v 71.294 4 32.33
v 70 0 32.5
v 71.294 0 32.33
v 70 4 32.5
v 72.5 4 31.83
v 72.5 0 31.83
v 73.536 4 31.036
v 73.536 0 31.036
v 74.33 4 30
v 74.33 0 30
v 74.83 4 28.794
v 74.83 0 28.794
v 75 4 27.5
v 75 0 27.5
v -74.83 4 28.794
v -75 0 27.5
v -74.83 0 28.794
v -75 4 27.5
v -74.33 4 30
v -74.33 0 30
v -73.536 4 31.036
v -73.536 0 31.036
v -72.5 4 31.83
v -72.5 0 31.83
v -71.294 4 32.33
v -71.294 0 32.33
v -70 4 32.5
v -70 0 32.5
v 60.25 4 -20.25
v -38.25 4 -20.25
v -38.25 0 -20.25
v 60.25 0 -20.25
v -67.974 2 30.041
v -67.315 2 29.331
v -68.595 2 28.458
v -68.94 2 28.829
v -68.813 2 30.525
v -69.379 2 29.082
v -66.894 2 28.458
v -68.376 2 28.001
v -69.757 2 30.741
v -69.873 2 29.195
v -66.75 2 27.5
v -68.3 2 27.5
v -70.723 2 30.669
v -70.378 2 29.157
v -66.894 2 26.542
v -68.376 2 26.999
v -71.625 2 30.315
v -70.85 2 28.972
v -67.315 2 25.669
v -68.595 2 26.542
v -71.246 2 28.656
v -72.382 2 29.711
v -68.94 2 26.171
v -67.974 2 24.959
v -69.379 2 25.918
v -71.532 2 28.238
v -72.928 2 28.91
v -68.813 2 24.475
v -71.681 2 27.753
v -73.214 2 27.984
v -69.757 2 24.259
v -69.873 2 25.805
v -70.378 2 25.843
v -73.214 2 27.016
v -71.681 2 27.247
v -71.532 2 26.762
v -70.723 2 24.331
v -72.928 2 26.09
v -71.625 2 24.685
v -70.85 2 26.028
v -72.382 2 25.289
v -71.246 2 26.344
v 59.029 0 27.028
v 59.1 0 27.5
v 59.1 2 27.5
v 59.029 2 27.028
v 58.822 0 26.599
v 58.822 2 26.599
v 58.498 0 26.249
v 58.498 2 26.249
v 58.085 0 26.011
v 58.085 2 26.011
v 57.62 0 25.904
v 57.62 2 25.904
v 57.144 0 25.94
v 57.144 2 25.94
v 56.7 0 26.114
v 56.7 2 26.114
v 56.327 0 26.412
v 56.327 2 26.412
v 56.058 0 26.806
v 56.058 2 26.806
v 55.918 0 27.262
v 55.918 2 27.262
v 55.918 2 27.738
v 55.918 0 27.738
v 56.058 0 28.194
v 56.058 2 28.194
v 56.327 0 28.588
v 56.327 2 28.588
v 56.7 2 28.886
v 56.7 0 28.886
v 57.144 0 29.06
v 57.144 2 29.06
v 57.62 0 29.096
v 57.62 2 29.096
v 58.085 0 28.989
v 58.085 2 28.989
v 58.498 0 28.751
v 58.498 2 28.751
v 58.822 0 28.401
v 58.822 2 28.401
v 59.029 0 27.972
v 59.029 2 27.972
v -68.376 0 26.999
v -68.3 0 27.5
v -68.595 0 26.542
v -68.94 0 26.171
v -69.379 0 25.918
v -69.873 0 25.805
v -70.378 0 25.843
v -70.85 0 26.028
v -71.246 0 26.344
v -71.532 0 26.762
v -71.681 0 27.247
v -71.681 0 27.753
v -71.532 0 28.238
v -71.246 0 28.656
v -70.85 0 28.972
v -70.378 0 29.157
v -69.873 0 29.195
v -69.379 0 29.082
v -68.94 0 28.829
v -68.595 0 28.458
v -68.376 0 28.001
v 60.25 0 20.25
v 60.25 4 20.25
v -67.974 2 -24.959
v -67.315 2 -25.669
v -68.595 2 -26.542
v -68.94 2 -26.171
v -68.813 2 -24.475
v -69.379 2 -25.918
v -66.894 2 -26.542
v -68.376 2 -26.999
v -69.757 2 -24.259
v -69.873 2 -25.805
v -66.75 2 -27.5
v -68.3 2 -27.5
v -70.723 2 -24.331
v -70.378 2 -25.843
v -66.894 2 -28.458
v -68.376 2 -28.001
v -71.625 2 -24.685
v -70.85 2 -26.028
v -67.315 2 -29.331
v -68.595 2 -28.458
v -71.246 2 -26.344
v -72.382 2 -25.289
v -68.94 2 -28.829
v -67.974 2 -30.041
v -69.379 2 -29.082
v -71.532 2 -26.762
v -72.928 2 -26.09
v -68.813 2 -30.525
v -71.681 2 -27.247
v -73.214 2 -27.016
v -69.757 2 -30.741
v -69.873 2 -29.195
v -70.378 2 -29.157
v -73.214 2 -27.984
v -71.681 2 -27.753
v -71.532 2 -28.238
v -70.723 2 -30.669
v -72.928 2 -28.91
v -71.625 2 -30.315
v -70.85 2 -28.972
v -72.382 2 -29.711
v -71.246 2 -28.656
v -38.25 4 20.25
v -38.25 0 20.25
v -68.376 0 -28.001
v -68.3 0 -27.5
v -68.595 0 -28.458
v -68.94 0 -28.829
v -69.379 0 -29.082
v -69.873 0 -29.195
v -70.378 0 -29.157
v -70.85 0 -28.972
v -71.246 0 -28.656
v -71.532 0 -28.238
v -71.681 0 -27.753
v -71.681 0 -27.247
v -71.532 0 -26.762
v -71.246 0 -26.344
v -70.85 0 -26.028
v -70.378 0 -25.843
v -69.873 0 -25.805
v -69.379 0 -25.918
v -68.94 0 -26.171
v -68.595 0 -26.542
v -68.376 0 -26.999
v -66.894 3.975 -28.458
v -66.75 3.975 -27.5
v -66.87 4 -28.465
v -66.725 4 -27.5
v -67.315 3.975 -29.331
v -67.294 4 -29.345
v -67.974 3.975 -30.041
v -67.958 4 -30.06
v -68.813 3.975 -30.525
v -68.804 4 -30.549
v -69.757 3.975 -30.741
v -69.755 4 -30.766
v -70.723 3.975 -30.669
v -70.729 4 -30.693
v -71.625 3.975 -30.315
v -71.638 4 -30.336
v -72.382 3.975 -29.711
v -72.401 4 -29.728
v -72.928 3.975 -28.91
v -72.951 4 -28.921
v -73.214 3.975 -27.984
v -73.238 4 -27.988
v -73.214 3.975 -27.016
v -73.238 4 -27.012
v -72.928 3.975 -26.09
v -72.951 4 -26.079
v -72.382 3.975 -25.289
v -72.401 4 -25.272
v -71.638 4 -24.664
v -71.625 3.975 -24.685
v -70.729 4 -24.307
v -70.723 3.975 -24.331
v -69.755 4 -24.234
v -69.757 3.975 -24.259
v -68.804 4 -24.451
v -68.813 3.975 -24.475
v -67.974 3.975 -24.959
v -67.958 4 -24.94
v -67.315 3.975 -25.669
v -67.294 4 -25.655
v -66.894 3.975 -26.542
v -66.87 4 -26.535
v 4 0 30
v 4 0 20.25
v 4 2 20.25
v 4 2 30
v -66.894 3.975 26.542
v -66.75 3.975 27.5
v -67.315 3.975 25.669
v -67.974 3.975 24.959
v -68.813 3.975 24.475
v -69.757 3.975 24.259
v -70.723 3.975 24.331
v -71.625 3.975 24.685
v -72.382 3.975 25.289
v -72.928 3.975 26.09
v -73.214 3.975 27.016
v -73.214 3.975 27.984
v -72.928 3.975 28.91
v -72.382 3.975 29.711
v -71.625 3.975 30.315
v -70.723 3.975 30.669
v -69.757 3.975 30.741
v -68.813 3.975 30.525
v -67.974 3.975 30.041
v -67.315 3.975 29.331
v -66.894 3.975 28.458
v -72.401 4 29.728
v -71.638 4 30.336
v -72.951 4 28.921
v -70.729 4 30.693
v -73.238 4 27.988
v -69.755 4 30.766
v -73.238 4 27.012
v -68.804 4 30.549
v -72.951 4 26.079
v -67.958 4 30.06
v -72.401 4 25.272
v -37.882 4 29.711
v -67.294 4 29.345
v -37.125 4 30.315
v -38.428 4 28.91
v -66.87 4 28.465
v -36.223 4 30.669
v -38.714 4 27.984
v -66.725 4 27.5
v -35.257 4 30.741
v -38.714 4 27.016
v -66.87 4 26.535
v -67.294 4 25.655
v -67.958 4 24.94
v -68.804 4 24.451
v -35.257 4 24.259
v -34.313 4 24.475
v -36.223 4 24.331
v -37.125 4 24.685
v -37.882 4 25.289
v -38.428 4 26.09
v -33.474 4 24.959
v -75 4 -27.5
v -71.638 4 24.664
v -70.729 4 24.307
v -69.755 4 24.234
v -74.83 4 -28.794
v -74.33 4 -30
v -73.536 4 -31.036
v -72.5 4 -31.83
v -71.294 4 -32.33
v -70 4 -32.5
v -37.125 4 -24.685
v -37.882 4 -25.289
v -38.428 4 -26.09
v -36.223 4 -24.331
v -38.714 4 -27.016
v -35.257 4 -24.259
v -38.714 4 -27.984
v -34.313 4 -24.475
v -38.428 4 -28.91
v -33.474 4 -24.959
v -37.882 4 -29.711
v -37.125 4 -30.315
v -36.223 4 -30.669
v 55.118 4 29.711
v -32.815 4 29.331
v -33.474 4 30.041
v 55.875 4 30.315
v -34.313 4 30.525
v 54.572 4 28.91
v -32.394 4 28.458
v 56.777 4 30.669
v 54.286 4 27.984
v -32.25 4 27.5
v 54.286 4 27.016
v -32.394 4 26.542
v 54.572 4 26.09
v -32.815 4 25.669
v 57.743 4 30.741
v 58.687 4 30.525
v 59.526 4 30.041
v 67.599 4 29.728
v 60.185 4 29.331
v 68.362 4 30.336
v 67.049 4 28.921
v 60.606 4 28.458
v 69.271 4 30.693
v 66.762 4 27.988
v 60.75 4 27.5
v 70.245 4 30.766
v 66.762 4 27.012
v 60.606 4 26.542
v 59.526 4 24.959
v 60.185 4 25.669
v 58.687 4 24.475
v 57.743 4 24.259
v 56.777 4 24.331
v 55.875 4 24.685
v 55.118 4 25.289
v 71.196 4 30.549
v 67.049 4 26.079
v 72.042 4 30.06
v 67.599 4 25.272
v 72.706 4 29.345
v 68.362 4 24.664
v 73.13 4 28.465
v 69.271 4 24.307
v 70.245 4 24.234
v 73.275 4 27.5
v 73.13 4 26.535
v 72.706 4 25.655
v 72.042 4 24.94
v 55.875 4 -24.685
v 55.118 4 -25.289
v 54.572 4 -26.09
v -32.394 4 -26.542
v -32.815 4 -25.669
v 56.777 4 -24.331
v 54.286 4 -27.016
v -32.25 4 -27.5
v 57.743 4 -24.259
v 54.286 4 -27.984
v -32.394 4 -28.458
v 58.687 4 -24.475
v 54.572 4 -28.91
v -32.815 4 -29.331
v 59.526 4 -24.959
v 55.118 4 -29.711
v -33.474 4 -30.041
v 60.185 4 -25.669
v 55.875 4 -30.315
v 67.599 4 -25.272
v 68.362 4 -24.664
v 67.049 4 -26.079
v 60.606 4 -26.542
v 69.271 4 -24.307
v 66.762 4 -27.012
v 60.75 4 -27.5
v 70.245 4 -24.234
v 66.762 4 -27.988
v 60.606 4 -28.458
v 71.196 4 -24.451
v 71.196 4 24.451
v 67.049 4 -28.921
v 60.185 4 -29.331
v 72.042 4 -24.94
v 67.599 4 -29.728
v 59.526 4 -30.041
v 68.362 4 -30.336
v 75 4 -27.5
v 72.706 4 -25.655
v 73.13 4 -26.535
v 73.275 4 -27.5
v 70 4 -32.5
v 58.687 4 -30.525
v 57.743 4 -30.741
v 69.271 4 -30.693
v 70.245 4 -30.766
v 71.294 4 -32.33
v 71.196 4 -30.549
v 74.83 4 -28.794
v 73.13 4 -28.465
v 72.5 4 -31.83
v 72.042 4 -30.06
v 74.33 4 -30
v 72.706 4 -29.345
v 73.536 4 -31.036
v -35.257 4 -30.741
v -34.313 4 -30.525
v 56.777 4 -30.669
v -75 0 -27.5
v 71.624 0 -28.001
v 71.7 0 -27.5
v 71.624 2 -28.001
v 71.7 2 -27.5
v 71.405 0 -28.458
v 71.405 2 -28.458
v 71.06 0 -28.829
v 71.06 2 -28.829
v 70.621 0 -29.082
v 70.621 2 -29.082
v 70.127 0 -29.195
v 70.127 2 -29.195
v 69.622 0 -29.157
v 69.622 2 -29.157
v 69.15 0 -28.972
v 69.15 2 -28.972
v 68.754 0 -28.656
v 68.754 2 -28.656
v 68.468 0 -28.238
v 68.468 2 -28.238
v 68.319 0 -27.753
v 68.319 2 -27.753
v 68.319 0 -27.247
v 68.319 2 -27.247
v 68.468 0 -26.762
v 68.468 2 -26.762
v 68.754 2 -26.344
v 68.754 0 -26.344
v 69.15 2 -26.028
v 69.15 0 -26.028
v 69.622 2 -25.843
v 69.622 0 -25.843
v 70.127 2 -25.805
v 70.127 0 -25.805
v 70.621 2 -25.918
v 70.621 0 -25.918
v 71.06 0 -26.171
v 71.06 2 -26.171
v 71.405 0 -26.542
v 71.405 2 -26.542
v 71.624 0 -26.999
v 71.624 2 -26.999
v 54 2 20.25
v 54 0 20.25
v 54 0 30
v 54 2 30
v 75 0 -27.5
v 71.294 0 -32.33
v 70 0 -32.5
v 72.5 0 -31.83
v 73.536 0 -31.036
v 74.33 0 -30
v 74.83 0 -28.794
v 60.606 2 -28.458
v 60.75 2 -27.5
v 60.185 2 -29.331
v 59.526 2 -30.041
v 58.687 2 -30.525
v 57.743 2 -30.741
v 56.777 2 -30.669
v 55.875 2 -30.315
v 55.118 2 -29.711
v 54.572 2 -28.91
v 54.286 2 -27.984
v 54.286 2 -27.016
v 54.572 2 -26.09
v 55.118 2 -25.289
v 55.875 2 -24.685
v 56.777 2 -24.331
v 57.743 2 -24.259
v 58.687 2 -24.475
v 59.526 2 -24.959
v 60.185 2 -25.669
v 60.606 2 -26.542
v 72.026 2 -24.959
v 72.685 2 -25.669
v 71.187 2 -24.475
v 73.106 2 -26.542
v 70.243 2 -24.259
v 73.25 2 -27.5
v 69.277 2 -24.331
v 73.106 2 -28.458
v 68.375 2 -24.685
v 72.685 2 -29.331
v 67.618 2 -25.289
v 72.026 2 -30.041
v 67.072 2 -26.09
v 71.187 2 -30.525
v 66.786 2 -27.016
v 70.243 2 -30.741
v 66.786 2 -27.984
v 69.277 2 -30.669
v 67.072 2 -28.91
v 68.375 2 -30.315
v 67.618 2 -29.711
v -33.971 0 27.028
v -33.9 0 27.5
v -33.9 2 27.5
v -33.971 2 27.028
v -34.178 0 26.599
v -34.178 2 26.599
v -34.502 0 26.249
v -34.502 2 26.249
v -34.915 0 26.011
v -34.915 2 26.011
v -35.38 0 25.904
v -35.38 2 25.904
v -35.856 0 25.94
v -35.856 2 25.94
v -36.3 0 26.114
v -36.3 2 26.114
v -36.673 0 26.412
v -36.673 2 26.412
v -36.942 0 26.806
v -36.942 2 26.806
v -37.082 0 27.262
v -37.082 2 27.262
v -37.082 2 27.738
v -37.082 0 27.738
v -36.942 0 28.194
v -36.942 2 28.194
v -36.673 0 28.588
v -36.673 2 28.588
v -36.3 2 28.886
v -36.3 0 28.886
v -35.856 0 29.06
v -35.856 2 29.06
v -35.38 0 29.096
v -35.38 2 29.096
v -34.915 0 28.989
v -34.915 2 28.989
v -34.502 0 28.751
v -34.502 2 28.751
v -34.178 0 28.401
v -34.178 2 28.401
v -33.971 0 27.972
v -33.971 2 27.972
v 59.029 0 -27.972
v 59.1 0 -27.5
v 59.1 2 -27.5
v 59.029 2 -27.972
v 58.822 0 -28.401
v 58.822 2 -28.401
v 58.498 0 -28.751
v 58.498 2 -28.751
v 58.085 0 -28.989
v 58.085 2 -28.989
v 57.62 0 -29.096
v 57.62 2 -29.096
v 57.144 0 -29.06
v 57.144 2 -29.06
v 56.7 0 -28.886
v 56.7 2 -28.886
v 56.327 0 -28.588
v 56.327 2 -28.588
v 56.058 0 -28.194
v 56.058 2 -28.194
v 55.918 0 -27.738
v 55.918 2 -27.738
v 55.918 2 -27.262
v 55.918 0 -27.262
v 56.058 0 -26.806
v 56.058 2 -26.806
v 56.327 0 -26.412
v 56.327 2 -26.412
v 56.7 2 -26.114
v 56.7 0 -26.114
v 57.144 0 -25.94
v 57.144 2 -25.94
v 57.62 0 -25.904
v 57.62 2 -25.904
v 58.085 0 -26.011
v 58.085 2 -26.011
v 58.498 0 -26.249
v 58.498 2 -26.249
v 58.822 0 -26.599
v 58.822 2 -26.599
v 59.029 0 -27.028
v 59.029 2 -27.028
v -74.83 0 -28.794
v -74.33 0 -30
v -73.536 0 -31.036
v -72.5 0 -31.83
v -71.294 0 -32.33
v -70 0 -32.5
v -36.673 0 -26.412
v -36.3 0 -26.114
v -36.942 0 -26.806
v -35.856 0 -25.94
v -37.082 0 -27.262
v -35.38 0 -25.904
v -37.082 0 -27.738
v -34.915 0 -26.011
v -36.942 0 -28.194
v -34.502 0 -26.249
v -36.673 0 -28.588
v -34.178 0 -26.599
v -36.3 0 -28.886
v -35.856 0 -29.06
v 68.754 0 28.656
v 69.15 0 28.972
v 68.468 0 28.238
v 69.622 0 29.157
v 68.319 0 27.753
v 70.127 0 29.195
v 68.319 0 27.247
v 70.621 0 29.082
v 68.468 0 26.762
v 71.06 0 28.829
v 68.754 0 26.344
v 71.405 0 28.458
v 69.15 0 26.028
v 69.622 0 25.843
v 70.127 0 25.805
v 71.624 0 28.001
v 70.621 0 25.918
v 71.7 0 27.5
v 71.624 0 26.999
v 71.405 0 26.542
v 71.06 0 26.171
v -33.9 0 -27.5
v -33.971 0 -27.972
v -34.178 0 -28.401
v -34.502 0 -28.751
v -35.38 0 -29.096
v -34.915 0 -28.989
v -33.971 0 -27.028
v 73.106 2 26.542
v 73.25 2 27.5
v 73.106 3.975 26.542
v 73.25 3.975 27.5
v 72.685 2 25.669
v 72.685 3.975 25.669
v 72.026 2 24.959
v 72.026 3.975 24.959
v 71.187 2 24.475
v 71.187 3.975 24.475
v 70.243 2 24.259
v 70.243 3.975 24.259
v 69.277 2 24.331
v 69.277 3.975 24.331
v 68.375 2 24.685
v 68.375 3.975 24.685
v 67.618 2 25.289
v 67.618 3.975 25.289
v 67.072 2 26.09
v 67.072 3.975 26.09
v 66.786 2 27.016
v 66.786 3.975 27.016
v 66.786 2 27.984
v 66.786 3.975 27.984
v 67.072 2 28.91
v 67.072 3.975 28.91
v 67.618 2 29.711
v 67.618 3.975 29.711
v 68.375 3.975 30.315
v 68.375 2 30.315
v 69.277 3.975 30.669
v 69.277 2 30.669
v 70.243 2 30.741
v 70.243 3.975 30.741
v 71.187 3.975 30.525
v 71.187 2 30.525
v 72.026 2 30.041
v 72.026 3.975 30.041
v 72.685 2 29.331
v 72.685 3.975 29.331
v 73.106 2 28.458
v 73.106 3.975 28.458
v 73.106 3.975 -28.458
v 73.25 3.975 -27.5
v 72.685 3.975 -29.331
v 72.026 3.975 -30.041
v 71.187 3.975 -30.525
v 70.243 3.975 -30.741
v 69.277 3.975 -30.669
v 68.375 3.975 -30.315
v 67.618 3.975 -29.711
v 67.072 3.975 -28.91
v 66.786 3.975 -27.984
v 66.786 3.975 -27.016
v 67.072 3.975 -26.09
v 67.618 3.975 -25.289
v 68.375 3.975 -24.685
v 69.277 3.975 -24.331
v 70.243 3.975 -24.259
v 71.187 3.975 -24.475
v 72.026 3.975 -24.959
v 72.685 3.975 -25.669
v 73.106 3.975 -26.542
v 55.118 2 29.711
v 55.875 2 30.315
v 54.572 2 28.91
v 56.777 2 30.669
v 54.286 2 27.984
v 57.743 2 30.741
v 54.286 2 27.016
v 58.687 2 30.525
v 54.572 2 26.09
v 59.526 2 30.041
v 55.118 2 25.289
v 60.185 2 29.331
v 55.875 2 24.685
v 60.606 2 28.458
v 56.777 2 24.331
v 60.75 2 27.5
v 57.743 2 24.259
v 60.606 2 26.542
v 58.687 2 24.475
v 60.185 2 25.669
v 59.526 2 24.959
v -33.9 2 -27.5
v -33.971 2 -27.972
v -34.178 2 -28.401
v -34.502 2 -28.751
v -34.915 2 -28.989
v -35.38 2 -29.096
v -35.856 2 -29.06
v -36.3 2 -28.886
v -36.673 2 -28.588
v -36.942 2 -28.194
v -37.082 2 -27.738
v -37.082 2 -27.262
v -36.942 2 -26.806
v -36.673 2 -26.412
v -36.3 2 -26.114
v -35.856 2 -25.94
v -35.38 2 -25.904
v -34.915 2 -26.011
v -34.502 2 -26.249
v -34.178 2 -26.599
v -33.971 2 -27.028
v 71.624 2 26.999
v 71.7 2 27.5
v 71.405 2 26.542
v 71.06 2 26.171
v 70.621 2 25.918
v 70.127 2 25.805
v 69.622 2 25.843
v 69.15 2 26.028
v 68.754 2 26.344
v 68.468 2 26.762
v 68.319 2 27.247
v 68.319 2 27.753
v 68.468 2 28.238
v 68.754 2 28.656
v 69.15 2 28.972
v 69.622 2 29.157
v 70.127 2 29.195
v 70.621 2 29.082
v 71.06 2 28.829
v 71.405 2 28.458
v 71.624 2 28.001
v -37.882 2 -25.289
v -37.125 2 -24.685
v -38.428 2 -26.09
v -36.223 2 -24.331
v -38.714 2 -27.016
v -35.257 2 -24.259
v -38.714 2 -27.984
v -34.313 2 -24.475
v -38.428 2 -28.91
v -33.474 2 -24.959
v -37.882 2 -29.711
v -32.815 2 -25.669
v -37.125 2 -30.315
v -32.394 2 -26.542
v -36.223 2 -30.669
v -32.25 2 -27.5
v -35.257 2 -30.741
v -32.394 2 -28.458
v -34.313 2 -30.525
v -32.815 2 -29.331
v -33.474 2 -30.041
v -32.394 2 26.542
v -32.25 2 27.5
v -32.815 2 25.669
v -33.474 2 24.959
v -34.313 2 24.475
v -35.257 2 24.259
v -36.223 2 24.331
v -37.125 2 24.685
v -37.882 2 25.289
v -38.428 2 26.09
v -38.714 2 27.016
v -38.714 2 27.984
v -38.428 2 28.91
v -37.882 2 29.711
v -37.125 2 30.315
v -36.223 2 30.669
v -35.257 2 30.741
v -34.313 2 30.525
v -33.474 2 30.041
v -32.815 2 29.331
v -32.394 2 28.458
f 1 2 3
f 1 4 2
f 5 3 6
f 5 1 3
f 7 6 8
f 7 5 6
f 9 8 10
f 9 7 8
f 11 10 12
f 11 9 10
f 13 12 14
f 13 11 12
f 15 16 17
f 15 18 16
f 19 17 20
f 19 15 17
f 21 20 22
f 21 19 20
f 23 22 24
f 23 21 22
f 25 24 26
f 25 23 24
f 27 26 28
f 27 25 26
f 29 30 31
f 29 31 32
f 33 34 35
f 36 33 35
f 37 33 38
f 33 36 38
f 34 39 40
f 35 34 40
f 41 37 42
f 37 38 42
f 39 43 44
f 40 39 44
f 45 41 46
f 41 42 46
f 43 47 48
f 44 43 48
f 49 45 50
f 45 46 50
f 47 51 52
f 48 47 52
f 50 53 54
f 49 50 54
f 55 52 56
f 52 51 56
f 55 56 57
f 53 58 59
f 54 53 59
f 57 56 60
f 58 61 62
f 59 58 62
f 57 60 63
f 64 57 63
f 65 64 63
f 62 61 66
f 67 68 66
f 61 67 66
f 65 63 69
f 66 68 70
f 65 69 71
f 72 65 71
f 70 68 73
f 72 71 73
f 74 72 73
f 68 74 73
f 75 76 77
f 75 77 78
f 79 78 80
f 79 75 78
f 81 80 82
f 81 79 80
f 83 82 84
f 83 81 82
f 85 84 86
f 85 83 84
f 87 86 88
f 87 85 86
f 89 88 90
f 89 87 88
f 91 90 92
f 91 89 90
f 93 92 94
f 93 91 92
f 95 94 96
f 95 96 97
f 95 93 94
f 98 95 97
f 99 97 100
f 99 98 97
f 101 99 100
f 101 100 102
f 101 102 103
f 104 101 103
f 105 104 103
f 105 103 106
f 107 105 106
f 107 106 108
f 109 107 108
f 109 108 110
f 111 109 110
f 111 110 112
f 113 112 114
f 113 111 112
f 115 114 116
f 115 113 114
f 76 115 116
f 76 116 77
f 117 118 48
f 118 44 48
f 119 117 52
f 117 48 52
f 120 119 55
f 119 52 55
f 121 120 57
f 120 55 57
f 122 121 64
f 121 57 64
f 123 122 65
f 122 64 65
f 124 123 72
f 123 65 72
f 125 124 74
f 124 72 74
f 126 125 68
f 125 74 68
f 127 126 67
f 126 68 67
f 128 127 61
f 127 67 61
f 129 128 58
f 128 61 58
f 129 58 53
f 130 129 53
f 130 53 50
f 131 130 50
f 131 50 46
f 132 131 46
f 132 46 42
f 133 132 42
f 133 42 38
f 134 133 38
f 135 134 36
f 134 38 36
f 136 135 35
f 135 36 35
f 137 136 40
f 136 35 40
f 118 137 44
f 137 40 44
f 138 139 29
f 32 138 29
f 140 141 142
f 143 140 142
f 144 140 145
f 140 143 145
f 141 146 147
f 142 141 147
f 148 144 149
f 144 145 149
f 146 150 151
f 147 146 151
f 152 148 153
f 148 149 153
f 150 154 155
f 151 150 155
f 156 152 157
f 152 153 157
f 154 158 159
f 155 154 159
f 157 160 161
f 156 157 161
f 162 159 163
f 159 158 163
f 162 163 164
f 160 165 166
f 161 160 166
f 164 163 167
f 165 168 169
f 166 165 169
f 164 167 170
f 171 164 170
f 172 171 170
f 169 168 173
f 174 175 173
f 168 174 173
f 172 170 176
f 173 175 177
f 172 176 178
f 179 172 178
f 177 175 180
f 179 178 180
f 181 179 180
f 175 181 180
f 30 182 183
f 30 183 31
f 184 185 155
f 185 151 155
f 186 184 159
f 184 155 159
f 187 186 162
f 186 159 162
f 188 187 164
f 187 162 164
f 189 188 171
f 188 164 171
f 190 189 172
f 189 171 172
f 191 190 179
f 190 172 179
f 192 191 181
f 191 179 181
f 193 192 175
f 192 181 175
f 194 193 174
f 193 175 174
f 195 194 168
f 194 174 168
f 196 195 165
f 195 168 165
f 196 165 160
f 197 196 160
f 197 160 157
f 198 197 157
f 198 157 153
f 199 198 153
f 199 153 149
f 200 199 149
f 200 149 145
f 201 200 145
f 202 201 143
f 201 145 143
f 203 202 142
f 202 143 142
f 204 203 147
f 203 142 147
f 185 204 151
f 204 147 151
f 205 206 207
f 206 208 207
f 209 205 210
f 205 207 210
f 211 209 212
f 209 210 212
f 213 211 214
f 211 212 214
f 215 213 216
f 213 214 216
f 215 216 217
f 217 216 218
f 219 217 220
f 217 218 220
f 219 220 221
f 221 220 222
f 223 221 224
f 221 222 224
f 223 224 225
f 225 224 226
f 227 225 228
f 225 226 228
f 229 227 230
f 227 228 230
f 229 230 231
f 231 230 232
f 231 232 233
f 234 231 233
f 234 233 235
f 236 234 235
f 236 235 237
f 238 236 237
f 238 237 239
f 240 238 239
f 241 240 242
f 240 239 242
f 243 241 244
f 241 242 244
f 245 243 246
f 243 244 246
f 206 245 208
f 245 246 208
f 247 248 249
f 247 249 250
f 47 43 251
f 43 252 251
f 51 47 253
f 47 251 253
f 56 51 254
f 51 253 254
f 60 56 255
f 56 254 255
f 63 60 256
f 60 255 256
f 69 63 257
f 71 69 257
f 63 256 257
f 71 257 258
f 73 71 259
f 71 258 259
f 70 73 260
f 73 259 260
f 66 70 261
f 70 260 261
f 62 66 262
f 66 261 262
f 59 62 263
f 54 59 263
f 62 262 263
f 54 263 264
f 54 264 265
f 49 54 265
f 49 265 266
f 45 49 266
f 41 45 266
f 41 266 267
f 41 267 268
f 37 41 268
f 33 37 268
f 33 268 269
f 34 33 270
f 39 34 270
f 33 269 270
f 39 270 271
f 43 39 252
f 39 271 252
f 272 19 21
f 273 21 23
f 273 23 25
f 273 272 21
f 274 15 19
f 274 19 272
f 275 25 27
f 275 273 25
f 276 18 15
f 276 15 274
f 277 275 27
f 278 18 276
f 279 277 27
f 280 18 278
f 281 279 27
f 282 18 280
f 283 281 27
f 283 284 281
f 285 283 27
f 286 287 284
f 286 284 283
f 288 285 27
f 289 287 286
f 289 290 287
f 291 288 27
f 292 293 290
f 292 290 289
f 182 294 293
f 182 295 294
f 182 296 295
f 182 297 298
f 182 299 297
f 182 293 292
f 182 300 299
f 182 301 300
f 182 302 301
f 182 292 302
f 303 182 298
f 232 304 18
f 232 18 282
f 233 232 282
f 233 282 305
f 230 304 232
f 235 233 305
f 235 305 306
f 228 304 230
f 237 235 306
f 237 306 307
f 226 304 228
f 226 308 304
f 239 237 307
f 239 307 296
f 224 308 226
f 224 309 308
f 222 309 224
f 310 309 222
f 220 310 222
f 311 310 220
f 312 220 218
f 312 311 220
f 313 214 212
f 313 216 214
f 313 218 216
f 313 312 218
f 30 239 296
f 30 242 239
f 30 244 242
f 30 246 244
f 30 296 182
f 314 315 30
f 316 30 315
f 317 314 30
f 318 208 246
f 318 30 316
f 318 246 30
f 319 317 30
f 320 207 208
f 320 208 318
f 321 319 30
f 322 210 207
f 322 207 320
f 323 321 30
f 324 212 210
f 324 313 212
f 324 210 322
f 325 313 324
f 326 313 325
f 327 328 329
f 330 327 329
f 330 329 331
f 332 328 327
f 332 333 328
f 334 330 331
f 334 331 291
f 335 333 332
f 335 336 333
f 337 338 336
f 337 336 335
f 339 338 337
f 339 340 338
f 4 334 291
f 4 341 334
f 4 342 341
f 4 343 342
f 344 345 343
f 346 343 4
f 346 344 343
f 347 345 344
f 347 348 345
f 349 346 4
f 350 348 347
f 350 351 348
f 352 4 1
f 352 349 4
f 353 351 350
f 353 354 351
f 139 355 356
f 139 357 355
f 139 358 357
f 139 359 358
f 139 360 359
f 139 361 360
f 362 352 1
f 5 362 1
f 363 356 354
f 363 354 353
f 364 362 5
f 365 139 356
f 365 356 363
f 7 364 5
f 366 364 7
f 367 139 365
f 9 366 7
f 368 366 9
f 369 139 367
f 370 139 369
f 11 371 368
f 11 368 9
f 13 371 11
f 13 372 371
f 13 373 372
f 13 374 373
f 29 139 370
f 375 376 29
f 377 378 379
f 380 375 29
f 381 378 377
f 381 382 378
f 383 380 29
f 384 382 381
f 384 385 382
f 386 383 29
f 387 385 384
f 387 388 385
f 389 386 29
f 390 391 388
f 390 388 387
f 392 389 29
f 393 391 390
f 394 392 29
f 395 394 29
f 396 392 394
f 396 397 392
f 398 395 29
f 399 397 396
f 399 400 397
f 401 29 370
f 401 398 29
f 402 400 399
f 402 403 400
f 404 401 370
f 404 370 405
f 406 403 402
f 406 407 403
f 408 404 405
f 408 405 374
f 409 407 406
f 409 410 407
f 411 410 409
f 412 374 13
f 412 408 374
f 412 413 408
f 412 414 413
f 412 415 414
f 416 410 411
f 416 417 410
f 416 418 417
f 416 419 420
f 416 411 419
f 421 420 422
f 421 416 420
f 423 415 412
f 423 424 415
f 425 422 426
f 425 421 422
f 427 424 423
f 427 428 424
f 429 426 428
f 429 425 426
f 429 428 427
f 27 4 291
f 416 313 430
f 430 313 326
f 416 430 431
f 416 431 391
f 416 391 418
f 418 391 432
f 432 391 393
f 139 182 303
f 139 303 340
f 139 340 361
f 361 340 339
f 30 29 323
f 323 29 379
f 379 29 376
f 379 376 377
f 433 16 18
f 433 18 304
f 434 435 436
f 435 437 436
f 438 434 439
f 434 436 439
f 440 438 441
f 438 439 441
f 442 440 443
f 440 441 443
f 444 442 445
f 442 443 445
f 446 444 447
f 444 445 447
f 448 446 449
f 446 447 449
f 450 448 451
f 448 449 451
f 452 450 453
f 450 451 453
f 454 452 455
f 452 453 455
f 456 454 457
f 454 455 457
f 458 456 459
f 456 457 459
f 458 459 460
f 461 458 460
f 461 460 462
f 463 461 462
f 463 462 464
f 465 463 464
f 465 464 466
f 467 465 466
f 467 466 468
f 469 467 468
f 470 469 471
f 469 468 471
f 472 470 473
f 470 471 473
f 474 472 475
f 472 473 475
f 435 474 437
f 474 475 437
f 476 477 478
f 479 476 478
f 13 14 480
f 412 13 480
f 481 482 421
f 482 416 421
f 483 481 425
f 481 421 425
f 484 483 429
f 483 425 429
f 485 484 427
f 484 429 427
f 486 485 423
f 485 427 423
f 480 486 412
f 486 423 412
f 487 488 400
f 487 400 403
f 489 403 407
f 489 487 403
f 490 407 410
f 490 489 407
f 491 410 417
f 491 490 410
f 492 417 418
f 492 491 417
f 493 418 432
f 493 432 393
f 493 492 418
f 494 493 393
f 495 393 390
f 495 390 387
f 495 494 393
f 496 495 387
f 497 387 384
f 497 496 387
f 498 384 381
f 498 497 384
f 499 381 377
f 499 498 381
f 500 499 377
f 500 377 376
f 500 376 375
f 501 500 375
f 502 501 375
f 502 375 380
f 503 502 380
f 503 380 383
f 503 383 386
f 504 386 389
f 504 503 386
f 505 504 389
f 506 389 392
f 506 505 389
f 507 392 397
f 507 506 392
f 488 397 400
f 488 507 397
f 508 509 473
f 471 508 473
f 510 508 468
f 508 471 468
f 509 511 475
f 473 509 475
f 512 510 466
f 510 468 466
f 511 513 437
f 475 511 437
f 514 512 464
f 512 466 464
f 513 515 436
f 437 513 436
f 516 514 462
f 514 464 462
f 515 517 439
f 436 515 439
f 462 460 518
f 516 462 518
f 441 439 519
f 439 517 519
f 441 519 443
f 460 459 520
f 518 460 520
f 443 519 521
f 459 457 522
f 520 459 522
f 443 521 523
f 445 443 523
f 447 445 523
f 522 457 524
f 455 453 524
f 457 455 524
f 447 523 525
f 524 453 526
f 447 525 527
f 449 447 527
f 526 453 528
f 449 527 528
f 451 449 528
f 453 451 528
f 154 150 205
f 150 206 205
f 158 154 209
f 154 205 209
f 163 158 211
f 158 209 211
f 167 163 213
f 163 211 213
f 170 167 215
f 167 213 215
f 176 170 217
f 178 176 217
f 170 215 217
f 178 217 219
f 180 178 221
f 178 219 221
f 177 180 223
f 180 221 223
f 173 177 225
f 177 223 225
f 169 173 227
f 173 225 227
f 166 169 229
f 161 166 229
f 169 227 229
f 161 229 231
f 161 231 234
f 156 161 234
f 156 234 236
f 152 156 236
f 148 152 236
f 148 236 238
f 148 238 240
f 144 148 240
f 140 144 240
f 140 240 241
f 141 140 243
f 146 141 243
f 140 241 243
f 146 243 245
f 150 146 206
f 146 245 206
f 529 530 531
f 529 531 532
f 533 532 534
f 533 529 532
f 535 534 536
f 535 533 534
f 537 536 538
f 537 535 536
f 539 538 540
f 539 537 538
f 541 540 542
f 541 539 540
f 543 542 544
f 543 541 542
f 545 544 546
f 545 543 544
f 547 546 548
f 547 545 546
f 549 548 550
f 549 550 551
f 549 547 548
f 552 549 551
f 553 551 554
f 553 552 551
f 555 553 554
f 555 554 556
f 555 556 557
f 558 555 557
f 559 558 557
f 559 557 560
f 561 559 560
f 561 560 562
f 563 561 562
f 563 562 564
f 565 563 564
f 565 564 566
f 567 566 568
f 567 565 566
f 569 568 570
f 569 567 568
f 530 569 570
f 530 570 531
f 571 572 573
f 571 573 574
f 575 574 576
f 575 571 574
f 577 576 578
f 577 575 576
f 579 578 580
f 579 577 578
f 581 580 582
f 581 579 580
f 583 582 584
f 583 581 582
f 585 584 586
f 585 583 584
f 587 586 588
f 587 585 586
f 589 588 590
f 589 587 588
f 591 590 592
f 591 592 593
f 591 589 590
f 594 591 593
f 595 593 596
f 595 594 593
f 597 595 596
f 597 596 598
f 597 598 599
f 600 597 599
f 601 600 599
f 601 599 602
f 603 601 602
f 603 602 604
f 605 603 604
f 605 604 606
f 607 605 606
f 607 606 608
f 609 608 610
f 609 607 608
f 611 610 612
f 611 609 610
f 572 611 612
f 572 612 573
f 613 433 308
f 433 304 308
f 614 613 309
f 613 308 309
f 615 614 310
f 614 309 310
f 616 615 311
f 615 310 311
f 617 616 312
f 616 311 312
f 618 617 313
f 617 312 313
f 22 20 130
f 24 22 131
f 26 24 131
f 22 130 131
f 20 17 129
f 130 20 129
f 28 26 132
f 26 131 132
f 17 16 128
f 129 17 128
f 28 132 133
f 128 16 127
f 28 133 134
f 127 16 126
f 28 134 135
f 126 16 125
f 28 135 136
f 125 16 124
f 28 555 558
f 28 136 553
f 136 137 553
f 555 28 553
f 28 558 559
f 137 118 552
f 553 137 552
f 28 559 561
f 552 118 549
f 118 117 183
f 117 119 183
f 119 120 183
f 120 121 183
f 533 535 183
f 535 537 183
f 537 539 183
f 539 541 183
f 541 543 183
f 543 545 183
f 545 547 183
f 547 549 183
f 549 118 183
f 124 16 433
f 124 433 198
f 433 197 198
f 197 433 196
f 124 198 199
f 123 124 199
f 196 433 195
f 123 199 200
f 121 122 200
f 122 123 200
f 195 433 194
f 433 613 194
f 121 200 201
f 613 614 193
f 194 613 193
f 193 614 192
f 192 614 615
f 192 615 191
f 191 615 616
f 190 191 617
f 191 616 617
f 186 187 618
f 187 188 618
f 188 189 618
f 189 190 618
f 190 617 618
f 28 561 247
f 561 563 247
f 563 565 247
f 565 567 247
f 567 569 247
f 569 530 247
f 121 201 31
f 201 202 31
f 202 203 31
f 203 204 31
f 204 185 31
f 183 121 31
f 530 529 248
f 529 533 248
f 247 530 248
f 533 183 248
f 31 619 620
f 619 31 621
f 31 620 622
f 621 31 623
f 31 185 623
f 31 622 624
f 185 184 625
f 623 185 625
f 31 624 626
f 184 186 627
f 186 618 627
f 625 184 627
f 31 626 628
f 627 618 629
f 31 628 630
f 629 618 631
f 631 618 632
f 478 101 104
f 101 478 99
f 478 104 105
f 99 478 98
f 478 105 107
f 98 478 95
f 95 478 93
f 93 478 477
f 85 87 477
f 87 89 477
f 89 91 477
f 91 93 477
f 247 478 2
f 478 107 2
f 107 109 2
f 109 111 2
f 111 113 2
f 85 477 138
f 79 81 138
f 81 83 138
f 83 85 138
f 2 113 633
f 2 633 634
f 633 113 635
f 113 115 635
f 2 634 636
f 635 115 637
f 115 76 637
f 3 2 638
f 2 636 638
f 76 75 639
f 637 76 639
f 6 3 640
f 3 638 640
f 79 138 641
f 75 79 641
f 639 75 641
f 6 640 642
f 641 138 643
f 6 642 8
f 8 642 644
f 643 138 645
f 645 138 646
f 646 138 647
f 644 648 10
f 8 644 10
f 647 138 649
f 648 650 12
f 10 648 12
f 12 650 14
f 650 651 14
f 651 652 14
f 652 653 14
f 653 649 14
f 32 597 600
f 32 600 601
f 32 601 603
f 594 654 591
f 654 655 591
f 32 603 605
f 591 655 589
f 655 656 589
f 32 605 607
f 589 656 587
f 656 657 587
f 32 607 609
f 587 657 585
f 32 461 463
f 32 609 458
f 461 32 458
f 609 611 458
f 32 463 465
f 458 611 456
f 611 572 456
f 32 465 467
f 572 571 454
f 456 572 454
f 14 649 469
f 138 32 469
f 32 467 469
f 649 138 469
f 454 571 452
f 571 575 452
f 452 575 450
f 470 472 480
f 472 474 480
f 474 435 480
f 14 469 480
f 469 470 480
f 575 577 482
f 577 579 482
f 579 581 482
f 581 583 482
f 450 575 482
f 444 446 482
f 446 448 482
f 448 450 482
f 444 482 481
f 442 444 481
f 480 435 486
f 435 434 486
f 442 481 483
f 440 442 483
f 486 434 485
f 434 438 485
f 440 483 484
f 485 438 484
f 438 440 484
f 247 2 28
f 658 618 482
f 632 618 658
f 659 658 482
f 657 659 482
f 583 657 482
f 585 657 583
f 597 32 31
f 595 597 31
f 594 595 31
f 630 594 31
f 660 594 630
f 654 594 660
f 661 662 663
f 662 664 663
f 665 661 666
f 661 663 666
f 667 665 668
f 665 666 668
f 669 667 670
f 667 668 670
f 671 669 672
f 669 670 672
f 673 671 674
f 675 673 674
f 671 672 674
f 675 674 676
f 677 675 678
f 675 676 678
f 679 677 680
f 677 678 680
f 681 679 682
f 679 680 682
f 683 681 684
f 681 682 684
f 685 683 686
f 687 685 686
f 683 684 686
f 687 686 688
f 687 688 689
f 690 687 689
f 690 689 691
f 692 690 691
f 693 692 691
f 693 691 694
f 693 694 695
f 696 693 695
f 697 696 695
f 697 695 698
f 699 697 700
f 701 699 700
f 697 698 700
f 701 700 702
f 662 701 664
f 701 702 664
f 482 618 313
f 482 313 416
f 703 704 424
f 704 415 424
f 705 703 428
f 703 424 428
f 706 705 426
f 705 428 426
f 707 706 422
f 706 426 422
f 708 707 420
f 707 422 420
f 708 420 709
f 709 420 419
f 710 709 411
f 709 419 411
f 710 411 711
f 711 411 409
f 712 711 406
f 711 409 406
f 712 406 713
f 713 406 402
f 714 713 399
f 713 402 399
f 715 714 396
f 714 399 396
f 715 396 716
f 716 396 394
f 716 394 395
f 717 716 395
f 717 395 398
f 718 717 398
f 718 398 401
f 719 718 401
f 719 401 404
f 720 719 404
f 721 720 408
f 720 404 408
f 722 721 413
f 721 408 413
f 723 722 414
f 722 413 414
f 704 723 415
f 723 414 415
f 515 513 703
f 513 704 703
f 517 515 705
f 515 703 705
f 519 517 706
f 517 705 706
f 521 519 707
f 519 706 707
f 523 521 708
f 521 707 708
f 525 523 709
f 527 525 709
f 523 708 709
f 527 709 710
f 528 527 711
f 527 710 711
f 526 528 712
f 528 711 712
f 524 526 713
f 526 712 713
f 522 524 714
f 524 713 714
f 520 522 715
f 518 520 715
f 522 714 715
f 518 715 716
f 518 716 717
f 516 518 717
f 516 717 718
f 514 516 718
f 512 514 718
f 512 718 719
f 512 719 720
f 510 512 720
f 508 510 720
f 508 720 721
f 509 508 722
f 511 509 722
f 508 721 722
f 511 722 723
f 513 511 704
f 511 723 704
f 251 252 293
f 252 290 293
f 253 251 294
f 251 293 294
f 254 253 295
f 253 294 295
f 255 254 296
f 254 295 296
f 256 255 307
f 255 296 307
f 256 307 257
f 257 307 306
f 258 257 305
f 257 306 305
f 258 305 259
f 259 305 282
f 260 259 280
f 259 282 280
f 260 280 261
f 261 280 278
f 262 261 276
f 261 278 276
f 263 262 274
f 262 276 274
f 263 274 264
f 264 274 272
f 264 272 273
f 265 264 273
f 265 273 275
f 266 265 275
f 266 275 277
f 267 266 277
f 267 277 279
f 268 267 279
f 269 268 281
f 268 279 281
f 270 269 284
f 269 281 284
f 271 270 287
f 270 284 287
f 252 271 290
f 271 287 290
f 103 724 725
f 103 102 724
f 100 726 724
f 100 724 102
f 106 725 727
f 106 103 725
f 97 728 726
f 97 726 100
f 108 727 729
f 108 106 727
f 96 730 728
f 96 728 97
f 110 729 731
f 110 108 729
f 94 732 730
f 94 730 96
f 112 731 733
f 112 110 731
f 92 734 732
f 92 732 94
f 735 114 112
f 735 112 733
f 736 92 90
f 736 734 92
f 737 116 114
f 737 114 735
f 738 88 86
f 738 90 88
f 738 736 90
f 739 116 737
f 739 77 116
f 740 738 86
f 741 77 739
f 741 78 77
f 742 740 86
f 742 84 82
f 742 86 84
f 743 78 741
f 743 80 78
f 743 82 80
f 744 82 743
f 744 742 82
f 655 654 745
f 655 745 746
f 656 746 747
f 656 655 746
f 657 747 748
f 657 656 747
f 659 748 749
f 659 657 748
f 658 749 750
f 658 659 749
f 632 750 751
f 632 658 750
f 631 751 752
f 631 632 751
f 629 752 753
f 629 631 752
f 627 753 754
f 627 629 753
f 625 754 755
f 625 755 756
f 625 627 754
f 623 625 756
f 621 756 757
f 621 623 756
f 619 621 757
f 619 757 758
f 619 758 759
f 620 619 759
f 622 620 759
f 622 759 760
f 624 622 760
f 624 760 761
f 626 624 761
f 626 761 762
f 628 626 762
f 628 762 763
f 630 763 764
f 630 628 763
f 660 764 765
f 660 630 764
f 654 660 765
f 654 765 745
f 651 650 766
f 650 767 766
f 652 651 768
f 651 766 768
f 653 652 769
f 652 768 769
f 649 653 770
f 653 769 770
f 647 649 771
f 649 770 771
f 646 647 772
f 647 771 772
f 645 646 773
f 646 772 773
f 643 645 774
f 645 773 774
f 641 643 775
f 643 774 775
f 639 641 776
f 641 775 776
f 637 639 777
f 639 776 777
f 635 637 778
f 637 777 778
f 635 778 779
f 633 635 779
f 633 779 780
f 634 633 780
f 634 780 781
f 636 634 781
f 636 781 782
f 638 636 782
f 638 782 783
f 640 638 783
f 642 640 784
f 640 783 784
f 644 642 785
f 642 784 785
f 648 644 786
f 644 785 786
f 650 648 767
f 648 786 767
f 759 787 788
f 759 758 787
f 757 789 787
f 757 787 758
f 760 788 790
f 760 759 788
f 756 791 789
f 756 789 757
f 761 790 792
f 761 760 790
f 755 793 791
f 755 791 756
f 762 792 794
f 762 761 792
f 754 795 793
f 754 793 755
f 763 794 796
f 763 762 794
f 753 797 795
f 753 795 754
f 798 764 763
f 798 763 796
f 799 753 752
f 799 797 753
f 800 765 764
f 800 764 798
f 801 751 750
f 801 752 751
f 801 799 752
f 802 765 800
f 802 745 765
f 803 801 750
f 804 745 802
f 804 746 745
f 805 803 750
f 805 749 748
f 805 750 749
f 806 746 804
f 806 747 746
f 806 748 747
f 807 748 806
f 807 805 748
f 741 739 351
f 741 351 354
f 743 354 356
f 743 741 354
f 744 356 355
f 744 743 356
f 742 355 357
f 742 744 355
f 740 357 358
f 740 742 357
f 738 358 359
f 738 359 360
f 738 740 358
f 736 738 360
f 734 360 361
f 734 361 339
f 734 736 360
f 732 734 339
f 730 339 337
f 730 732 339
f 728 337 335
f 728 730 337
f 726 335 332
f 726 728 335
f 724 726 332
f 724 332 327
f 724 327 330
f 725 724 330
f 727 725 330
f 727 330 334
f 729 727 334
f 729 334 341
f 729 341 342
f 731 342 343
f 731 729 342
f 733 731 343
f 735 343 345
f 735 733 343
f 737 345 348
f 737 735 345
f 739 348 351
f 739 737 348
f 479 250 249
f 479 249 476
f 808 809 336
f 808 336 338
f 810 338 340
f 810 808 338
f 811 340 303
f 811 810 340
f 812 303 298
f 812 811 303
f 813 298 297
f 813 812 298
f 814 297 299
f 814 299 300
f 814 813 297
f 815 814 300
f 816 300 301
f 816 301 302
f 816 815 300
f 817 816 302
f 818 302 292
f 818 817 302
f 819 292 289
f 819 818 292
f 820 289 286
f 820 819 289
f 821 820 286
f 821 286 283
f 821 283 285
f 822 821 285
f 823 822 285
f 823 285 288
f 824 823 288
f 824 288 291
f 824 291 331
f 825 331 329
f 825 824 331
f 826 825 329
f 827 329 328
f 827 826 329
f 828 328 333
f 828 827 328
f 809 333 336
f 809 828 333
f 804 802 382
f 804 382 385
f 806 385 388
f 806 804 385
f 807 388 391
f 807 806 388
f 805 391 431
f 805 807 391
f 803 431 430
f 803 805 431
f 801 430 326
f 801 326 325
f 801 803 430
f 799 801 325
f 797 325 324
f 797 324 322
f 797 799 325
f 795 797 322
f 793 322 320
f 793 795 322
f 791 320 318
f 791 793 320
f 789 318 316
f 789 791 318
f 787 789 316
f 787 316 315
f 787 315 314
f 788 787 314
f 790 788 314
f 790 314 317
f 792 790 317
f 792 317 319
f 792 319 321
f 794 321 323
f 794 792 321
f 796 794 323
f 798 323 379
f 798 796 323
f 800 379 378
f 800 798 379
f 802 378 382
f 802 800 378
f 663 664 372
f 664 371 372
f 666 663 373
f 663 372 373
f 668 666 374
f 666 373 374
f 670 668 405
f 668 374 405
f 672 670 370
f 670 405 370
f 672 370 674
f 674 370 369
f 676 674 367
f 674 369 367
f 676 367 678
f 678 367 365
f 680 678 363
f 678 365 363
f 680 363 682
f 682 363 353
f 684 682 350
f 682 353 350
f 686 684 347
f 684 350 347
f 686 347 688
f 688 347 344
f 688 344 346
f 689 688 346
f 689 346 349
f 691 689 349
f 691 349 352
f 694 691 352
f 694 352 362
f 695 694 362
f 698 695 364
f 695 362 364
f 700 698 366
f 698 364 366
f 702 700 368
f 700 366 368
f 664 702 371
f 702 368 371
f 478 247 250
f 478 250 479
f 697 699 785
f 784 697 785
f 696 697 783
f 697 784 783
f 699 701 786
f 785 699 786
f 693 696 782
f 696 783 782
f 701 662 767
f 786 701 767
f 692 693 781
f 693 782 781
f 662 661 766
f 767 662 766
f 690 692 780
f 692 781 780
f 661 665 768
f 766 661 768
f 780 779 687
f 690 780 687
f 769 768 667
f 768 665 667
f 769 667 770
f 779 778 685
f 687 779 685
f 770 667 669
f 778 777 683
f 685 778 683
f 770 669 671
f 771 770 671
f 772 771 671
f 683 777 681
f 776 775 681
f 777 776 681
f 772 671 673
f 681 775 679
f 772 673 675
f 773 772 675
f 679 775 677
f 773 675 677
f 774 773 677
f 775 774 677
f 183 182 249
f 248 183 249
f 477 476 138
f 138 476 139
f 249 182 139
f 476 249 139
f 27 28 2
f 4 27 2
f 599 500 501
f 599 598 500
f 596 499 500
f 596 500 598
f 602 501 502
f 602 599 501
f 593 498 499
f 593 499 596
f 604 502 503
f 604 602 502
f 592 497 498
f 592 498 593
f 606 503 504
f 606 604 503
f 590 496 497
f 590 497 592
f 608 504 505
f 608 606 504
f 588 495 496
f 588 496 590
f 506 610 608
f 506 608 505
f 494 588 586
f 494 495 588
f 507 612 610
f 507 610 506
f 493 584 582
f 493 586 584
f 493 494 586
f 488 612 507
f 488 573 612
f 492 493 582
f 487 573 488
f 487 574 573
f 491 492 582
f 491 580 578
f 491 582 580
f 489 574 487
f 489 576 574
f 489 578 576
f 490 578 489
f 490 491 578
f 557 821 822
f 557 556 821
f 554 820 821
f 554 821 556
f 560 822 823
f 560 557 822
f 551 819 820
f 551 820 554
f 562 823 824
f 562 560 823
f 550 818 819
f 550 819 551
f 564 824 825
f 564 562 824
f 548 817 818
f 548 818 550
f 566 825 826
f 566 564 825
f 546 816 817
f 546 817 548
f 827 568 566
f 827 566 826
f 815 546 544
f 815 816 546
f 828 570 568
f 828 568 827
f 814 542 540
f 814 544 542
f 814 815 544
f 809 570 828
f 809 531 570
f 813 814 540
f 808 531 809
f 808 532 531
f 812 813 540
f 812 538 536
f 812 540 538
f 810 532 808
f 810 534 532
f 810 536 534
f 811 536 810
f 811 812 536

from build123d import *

# Parameters (mm, degrees)
SKETCH1_W                          = 150
SKETCH1_H                          = 65
BODY_DEPTH                         = 4
EDGE_FILLETS_R                     = 5
SKETCH5_W                          = 98.5
SKETCH5_H                          = 40.5
LCD2004_SCREEN_CUTOUT_DEPTH        = 82.836727696
LCD2004_MOUNTING_HOLES_START       = 2
LCD2004_MOUNTING_HOLES_OUTLINE_R   = 3.25
LCD2004_MOUNTING_HOLES_DEPTH       = 2
LCD2004_MOUNTING_HOLES_2_OUTLINE_R = 1.6
LCD2004_MOUNTING_HOLES_2_DEPTH     = 2
SKETCH8_W                          = 50
SKETCH8_H                          = 9.75
LCD2004_SOLDERING_CUTOUT_DEPTH     = 2


# Read off the part's stored shape, not the designer's step: mounting_holes, lcd2004_mounting_holes
with BuildPart() as part:
    # Sketch1 → body (new body)
    with BuildSketch(Plane(origin=(0, 0, 0), x_dir=(1, 0, 0), z_dir=(0, 1, 0))):
        Rectangle(SKETCH1_W, SKETCH1_H)
    extrude(amount=BODY_DEPTH)

    # mounting_holes outline → mounting_holes (revolve, cut)
    with BuildSketch(Plane(origin=(70, 0, 27.5), x_dir=(1, 0, 0), z_dir=(0, 0, 1))):
        Polygon((0, 0), (1.7, 0), (1.7, 2), (3.25, 2), (3.25, 3.975), (3.275, 4), (0, 4), align=None)
    revolve(axis=Axis((70, 0, 27.5), (0, 1, 0)), mode=Mode.SUBTRACT)

    # mounting_holes 2 outline → mounting_holes 2 (revolve, cut)
    with BuildSketch(Plane(origin=(-70, 0, -27.5), x_dir=(1, 0, 0), z_dir=(0, 0, 1))):
        Polygon((0, 4), (0, 0), (1.7, 0), (1.7, 2), (3.25, 2), (3.25, 3.975), (3.275, 4), align=None)
    revolve(axis=Axis((-70, 0, -27.5), (0, 1, 0)), mode=Mode.SUBTRACT)

    # mounting_holes 3 outline → mounting_holes 3 (revolve, cut)
    with BuildSketch(Plane(origin=(70, 0, -27.5), x_dir=(1, 0, 0), z_dir=(0, 0, 1))):
        Polygon((0, 4), (0, 0), (1.7, 0), (1.7, 2), (3.25, 2), (3.25, 3.975), (3.275, 4), align=None)
    revolve(axis=Axis((70, 0, -27.5), (0, 1, 0)), mode=Mode.SUBTRACT)

    # mounting_holes 4 outline → mounting_holes 4 (revolve, cut)
    with BuildSketch(Plane(origin=(-70, 0, 27.5), x_dir=(1, 0, 0), z_dir=(0, 0, 1))):
        Polygon((0, 4), (0, 0), (1.7, 0), (1.7, 2), (3.25, 2), (3.25, 3.975), (3.275, 4), align=None)
    revolve(axis=Axis((-70, 0, 27.5), (0, 1, 0)), mode=Mode.SUBTRACT)

    # edge_fillets
    edge_fillets_edges = [part.edges().sort_by_distance(p)[0] for p in [
        (75, 2, 32.5),
        (-75, 2, 32.5),
        (-75, 2, -32.5),
        (75, 2, -32.5),
    ]]
    fillet(edge_fillets_edges, radius=EDGE_FILLETS_R)

    # Sketch5 → lcd2004_screen_cutout (cut, through all)
    with BuildSketch(Plane(origin=(0, 4, 0), x_dir=(1, 0, 0), z_dir=(0, 1, 0))):
        with Locations((11, 0)):
            Rectangle(SKETCH5_W, SKETCH5_H)
    extrude(amount=-LCD2004_SCREEN_CUTOUT_DEPTH, mode=Mode.SUBTRACT)

    # lcd2004_mounting_holes outline → lcd2004_mounting_holes (cut)
    with BuildSketch(Plane(origin=(0, 0, 0), x_dir=(1, 0, 0), z_dir=(0, 1, 0)).offset(LCD2004_MOUNTING_HOLES_START)):
        with Locations((57.5, 27.5)):
            Circle(LCD2004_MOUNTING_HOLES_OUTLINE_R)
        with Locations((-35.5, -27.5)):
            Circle(LCD2004_MOUNTING_HOLES_OUTLINE_R)
        with Locations((57.5, -27.5)):
            Circle(LCD2004_MOUNTING_HOLES_OUTLINE_R)
        with Locations((-35.5, 27.5)):
            Circle(LCD2004_MOUNTING_HOLES_OUTLINE_R)
    extrude(amount=LCD2004_MOUNTING_HOLES_DEPTH, mode=Mode.SUBTRACT)

    # lcd2004_mounting_holes 2 outline → lcd2004_mounting_holes 2 (cut)
    with BuildSketch(Plane(origin=(0, 0, 0), x_dir=(1, 0, 0), z_dir=(0, 1, 0))):
        with Locations((57.5, 27.5)):
            Circle(LCD2004_MOUNTING_HOLES_2_OUTLINE_R)
        with Locations((-35.5, -27.5)):
            Circle(LCD2004_MOUNTING_HOLES_2_OUTLINE_R)
        with Locations((57.5, -27.5)):
            Circle(LCD2004_MOUNTING_HOLES_2_OUTLINE_R)
        with Locations((-35.5, 27.5)):
            Circle(LCD2004_MOUNTING_HOLES_2_OUTLINE_R)
    extrude(amount=LCD2004_MOUNTING_HOLES_2_DEPTH, mode=Mode.SUBTRACT)

    # Sketch8 → lcd2004_soldering_cutout (cut)
    with BuildSketch(Plane.XZ):
        with Locations((29, 25.125)):
            Rectangle(SKETCH8_W, SKETCH8_H)
    extrude(amount=-LCD2004_SOLDERING_CUTOUT_DEPTH, mode=Mode.SUBTRACT)


solid = part.part
